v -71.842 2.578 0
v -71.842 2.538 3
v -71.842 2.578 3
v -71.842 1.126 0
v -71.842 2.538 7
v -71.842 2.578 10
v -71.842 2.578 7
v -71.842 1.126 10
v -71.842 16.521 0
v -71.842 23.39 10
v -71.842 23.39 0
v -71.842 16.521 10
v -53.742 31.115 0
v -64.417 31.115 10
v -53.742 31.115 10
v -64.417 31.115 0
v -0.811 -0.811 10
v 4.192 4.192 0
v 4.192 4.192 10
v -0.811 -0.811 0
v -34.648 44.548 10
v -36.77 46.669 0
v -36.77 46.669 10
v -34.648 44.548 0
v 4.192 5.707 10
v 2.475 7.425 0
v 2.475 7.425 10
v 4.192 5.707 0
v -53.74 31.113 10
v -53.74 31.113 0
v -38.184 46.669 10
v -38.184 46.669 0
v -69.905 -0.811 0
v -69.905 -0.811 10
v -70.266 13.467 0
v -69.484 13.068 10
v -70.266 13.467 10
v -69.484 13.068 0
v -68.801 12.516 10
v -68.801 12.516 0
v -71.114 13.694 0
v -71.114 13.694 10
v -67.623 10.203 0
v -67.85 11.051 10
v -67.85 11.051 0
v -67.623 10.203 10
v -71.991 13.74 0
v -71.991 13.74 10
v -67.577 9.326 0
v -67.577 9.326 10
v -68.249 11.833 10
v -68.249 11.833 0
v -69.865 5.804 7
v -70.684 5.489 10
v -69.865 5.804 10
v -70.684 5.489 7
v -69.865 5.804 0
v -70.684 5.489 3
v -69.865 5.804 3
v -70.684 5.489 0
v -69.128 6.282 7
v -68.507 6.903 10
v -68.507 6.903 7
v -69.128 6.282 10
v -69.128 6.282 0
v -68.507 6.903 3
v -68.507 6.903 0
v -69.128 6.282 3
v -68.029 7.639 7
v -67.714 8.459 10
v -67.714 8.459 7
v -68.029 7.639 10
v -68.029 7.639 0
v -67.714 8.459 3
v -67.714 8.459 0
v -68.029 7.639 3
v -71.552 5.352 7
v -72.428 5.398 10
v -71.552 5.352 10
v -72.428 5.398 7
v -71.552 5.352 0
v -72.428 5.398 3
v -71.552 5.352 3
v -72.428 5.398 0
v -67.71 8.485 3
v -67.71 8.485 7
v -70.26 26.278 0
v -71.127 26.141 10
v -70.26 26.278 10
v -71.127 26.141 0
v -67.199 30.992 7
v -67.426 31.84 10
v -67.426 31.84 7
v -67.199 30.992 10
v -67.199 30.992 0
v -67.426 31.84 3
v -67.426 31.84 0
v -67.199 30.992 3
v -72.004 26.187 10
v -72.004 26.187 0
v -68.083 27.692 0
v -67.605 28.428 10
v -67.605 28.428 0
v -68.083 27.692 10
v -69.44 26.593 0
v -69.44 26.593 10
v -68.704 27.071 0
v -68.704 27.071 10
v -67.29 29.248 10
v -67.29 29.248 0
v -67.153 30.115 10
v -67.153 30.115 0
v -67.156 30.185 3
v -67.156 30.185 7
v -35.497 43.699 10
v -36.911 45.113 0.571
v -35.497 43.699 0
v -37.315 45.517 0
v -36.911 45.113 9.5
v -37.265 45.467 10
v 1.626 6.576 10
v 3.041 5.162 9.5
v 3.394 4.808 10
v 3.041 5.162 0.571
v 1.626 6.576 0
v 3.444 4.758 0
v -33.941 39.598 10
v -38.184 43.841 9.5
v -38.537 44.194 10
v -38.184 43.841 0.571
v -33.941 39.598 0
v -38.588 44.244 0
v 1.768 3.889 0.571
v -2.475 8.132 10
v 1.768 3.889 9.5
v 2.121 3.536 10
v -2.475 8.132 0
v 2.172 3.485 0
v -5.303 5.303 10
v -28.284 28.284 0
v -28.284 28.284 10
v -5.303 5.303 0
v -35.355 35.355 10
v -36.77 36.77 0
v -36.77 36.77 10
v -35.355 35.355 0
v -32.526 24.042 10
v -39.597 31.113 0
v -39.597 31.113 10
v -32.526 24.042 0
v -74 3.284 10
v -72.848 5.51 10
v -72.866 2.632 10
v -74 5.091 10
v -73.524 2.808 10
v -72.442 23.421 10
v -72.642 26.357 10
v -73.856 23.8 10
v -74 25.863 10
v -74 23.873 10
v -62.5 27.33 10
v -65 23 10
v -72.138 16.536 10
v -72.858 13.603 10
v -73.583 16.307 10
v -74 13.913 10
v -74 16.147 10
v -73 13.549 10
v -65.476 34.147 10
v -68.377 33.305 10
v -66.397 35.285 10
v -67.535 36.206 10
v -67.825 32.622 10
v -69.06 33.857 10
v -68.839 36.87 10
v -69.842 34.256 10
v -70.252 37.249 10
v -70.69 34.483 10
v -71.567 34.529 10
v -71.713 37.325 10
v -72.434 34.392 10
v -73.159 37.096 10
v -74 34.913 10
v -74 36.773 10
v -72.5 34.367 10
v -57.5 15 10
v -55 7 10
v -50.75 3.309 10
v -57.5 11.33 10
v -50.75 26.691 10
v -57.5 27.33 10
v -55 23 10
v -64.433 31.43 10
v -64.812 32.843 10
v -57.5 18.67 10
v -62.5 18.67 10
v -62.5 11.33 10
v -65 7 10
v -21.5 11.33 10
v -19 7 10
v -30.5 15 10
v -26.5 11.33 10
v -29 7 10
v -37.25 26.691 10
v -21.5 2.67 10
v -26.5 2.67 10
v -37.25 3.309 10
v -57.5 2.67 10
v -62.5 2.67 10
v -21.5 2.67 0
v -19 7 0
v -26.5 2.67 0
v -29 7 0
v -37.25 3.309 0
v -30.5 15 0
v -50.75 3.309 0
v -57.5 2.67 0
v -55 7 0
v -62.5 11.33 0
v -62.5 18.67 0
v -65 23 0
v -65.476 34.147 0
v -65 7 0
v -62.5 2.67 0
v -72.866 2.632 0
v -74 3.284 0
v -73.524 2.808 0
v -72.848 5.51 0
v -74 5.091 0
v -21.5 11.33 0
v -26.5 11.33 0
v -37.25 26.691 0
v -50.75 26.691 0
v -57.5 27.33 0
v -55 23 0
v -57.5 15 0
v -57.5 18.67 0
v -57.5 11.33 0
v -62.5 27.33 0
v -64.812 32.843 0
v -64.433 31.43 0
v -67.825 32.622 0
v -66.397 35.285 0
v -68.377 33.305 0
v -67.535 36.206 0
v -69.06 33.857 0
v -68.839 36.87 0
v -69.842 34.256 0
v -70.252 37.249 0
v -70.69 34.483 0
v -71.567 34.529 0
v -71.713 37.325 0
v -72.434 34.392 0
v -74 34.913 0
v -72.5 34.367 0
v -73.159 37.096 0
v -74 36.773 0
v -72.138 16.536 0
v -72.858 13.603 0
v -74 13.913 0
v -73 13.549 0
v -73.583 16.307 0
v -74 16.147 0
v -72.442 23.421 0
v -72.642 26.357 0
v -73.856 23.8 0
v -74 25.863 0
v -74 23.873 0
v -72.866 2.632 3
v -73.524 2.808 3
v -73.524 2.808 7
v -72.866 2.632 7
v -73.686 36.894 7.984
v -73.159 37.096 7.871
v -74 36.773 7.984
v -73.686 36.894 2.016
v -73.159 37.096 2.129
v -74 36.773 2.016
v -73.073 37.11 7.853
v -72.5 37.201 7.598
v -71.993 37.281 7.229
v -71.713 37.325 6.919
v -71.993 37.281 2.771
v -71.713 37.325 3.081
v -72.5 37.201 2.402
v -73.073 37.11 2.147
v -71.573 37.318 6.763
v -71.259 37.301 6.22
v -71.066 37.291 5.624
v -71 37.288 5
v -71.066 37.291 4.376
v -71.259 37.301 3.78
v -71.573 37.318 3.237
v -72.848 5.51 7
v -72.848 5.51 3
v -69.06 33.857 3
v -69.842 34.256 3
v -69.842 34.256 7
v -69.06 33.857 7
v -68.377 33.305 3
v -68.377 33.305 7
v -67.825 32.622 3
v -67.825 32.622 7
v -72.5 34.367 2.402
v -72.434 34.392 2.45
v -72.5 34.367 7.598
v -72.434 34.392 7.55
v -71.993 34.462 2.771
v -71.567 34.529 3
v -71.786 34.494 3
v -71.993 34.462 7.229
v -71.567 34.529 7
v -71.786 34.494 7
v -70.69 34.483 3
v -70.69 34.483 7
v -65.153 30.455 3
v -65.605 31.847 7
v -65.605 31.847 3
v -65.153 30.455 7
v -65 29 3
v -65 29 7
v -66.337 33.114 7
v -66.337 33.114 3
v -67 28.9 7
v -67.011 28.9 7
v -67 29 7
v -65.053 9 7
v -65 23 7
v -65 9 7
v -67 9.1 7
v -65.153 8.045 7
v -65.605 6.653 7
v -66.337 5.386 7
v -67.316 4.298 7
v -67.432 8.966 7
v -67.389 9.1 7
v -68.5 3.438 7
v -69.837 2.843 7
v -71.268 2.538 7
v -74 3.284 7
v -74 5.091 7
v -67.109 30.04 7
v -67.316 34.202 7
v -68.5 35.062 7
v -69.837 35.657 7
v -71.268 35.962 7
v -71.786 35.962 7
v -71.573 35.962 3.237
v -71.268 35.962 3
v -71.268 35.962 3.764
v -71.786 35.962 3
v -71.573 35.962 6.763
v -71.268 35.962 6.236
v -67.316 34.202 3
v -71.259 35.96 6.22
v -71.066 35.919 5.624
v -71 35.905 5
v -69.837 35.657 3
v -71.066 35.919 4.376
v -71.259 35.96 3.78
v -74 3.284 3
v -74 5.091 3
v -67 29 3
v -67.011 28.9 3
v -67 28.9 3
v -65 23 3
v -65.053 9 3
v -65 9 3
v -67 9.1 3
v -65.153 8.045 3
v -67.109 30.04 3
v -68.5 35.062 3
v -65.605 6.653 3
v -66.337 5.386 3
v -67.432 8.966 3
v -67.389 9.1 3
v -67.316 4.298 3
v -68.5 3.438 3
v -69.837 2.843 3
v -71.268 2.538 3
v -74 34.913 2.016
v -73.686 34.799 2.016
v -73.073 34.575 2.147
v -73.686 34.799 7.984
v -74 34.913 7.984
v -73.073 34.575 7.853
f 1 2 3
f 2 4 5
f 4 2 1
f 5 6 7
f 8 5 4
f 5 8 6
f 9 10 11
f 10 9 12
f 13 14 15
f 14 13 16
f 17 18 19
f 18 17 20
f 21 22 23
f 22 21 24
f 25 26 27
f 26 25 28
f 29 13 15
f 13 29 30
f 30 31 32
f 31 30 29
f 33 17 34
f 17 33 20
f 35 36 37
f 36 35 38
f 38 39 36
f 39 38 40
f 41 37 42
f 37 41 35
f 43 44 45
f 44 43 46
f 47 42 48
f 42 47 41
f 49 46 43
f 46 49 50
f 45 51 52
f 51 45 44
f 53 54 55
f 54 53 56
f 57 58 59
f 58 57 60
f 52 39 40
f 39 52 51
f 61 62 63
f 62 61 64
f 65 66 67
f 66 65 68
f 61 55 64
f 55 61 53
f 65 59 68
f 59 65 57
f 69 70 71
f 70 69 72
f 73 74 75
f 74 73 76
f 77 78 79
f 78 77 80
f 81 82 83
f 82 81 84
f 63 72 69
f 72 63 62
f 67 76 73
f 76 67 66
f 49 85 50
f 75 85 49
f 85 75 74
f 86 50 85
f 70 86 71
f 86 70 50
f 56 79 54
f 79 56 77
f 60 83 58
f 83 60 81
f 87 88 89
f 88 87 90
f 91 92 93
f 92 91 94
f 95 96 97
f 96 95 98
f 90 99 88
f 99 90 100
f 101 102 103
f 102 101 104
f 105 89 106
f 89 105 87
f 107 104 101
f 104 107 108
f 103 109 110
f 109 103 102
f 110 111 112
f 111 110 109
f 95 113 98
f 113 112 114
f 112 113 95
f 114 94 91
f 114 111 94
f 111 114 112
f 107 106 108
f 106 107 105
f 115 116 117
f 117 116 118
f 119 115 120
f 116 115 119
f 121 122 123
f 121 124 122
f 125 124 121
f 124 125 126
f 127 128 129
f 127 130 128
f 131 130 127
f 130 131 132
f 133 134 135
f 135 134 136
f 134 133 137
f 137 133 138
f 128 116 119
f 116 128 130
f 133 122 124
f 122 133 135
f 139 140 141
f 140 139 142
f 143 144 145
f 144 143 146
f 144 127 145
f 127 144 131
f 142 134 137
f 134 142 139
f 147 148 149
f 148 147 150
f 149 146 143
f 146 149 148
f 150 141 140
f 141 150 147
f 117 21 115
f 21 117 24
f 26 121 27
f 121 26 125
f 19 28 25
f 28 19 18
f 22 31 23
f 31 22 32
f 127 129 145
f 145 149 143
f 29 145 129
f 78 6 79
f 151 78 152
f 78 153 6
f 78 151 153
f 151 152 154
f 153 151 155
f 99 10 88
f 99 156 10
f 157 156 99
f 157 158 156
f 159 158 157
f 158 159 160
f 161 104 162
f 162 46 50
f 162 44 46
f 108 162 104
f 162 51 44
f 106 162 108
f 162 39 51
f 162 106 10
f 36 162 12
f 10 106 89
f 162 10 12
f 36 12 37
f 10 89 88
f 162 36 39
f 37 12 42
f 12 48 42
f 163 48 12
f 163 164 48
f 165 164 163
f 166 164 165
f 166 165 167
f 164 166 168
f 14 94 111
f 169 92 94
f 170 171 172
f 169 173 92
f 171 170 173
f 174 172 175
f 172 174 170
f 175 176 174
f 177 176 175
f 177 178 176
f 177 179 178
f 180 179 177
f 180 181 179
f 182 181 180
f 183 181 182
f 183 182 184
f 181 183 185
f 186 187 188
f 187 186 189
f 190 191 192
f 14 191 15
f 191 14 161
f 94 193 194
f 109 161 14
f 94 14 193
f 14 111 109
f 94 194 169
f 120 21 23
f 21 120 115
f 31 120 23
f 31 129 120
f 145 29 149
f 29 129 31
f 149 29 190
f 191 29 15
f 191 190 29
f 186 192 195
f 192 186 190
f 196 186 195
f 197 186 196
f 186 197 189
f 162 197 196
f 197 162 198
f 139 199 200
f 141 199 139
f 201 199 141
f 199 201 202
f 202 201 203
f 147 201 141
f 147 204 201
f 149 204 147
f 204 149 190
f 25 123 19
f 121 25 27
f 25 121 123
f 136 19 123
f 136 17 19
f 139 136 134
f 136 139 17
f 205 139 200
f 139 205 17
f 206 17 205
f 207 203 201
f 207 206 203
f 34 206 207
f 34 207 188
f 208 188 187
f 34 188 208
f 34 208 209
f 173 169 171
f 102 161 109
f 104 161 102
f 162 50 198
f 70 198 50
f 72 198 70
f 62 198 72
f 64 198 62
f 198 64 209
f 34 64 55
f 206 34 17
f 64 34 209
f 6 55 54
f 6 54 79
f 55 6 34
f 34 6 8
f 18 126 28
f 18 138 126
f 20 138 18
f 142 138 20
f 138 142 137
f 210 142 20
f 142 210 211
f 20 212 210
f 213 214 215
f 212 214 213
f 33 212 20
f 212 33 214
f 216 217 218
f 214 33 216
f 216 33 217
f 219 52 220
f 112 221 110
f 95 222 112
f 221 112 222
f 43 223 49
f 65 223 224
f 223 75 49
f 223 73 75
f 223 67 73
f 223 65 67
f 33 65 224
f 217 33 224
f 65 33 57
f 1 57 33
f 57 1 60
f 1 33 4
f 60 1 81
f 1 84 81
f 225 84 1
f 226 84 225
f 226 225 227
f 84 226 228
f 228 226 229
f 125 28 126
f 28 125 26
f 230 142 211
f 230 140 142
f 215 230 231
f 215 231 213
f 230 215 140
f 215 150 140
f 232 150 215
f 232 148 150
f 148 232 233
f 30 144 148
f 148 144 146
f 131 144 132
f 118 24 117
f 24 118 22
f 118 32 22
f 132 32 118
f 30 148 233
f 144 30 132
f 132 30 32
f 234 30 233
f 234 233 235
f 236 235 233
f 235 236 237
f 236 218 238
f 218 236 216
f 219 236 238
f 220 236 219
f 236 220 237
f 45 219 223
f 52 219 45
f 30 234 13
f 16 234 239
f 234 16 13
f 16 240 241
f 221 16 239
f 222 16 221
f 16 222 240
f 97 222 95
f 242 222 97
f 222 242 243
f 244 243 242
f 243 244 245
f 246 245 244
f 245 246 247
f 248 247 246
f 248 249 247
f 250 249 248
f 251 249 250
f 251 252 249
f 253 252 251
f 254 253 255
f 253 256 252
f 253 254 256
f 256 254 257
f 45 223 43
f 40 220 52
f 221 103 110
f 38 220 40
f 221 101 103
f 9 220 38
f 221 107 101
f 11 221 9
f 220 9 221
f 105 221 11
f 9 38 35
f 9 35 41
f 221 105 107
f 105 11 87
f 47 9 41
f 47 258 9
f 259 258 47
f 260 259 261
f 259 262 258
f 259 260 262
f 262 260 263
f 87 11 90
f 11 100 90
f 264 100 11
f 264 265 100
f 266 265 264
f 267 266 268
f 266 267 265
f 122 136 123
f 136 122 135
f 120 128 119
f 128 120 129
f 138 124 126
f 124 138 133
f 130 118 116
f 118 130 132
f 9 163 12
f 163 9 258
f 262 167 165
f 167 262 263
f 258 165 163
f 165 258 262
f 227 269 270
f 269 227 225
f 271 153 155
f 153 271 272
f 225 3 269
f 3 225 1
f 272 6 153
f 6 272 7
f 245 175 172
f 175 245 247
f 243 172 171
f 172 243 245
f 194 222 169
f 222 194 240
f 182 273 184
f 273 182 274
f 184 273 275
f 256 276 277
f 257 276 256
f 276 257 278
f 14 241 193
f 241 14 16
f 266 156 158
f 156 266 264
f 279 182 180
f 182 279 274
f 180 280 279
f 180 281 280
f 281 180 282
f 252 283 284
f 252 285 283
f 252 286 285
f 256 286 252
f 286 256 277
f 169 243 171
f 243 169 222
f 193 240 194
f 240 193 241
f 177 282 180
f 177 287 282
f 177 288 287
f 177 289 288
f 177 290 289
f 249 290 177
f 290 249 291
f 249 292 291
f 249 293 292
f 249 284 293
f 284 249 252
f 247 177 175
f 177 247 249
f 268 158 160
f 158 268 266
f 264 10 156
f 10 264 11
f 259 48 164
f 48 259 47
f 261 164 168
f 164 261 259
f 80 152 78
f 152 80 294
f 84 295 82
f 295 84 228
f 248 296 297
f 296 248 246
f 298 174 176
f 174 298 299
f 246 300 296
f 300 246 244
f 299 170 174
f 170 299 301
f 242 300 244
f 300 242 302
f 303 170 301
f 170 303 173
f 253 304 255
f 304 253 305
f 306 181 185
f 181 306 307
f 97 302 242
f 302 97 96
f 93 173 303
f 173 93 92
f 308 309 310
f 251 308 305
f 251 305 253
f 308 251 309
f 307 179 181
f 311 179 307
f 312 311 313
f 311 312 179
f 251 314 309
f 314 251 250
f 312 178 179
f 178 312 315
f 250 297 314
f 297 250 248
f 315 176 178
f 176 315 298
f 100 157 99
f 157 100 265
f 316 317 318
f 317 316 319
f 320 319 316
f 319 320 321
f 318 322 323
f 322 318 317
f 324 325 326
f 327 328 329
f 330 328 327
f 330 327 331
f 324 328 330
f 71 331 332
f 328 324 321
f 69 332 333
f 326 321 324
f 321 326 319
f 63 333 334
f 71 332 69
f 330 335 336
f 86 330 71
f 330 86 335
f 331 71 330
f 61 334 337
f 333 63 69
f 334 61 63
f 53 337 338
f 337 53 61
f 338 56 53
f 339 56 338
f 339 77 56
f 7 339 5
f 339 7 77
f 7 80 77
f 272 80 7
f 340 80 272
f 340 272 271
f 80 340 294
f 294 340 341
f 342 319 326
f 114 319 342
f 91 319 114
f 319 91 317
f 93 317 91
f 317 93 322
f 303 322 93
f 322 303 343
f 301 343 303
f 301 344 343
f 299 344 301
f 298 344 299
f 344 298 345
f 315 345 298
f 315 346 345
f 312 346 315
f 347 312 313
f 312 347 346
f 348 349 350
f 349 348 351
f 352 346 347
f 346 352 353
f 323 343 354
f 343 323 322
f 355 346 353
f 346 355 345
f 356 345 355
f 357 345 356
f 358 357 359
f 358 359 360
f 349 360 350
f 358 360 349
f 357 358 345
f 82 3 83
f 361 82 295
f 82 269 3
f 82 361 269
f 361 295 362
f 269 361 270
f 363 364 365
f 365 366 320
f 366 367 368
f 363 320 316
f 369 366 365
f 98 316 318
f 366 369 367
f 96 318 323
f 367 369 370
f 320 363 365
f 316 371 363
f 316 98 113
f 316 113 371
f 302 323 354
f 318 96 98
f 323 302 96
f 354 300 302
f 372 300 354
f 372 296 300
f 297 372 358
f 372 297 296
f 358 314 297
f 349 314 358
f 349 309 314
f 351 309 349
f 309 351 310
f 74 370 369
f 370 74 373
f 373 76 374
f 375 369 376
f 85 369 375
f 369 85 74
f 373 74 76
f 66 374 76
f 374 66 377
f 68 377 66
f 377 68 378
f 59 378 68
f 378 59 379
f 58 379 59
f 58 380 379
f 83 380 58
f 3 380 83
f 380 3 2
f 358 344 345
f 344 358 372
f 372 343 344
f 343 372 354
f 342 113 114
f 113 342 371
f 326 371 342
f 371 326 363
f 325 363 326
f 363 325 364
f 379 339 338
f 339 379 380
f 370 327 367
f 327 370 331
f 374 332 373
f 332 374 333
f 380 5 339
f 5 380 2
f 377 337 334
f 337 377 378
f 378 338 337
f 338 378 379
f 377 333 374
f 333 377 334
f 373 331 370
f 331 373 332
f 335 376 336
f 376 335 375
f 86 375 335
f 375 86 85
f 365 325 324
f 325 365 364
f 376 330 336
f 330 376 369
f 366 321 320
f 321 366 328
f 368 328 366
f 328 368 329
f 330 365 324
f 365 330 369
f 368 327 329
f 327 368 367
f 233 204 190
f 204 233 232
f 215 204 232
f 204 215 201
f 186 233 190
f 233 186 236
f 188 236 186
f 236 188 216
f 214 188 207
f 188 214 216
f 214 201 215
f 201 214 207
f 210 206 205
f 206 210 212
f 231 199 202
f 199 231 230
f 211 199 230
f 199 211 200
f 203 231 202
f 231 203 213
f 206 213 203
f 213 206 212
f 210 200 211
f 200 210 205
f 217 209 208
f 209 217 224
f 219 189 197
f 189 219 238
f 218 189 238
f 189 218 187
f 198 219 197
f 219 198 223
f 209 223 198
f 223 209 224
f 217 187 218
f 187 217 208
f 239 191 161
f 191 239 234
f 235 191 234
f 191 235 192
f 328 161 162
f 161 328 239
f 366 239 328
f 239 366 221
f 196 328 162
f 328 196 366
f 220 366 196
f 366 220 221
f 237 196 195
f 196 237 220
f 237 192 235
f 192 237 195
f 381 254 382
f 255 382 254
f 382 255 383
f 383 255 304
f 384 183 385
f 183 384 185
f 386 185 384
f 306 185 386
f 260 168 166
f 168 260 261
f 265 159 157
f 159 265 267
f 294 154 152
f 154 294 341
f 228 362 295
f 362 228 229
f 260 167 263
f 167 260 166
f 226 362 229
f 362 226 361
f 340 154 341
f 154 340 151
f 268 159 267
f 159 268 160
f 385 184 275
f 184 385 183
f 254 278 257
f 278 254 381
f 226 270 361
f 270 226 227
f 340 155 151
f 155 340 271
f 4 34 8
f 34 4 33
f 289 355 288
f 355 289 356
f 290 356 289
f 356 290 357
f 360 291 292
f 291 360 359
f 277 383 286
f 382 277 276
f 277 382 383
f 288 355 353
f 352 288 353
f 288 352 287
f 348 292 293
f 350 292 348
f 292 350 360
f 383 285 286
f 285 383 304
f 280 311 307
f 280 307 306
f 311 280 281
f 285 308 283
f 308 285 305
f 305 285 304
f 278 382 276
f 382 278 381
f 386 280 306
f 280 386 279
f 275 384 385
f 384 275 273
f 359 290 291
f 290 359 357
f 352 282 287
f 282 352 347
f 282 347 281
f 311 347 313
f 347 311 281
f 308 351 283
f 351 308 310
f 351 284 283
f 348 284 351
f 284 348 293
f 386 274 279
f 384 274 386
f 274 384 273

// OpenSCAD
// PRUSA iteration3
// lcd-support-A
// GNU GPL v3
// Josef Průša <iam@josefprusa.cz> and contributors
// http://www.reprap.org/wiki/Prusa_Mendel
// http://prusamendel.org




module body(){

difference() {
    
    union(){
        translate( [ -55, -2 , 0 ] ) cube( [ 69 , 81 , 10 ] ); 
    }
    
    union (){

    // outer body shape
    translate( [ -69.6, 32, -1 ] ) rotate([0,0,45]) cube( [ 60 , 53 , 15 ] ); 
    translate( [ 13.7, 89.7, -1 ] ) rotate([0,0,135]) cube( [ 60 , 42 , 15 ] );
    translate( [ -19, -9, -1 ] ) cube( [ 60 , 9 , 15 ] );   
    translate( [ 7, -3, -1 ] ) cube( [ 60 , 68 , 16 ] );  
    translate( [ -16, 60, -1 ] ) cube( [ 60 , 50 , 15 ] );
    translate( [ -41, -45, -1 ] ) rotate([0,0,45]) cube( [ 60 , 80 , 13 ] );  
        
    // threaded rods opening
    translate( [ -44 , 57.5 , -1 ] ) cylinder( h = 17, r = 4.2, $fn=30);  
    translate( [ -29 , 71.9 , -1 ] ) cylinder( h = 17, r = 4.2, $fn=30);  

    // pcb cout out
    translate( [ 4 , 1.5 , -1 ] ) cube( [ 1.8 , 56.5 , 17 ] ); 
    translate( [ 0 , 7.5 , -1 ] ) cube( [ 5.8 , 44.5 , 17 ] ); 
    translate( [ -5.999, 40, -1 ] ) cube ( [ 6, 10, 17 ] );
    translate( [ 4.8 , 3.5 , -1 ] ) cube( [ 5.8 , 52.5 , 17 ] );

    translate( [ 8 , -5 , -1 ] ) rotate([0,0,45]) cube( [ 5 , 5 , 17 ] );
    translate( [ 8 , 58 , -1 ] ) rotate([0,0,45]) cube( [ 5 , 5 , 17 ] );
        
    }

    // pcb inserts
    translate( [ 4, 3 , 8 ] ) rotate([45,0,0]) cube( [ 1.8 , 5 , 5 ] ); 
    translate( [ 4, 56.5 , 8 ] ) rotate([45,0,0]) cube( [ 1.8 , 5 , 5 ] );     
    translate( [ 4, 3 , -5 ] ) rotate([45,0,0]) cube( [ 1.8 , 5 , 5 ] ); 
    translate( [ 4, 56.5 , -5 ] ) rotate([45,0,0]) cube( [ 1.8 , 5 , 5 ] );     
    
}

 
difference(){
    union(){
        translate( [ -44 , 57.5 , 0 ] ) cylinder( h = 10, r = 7, $fn=30); 
        translate( [ -29 , 71.9 , 0 ] ) cylinder( h = 10, r =7 , $fn=30); 
    }
        translate( [ -44 , 57.5 , -1 ] ) cylinder( h = 17, r = 4.2, $fn=30);
        translate( [ -29 , 71.9 , -1 ] ) cylinder( h = 17, r = 4.2, $fn=30);
}
}



module ziptie()
{
difference()
{
  union(){
    difference(){
        translate( [ -72 , 29 , 3 ] ) cylinder( h = 4, r = 7, $fn=30);
        translate( [ -72 , 29 , 3 ] ) cylinder( h = 4, r = 5, $fn=30);
    }
    difference(){
        translate( [ -72 , 9.5 , 3 ] ) cylinder( h = 4, r = 7, $fn=30);
        translate( [ -72 , 11 , 3 ] ) cylinder( h = 4, r = 5, $fn=30); 
    }
    }
    translate( [ -80 , 9.1 , 3 ] )  cube( [ 15 , 19.8 , 4 ] );  
    }
    
    translate( [ -67 , 9 , 3 ] )  cube( [ 2 , 20 , 4 ] ); 
}
    




difference() {
    
rotate([0,0,45]) body();

// lightening holes
translate( [ -44 , 15 , -1 ] ) cylinder( h = 15, r = 13.5, $fn=6);  
translate( [ -24 , 7 , -1 ] ) cylinder( h = 15, r = 5, $fn=6);  
translate( [ -60 , 7 , -1 ] ) cylinder( h = 15, r = 5, $fn=6);  
translate( [ -60 , 23 , -1 ] ) cylinder( h = 15, r = 5, $fn=6);  
    
// threaded rods corners
translate( [ -71 , 28.5 , -1 ] ) rotate([0,0,70]) cube( [ 5 , 10 , 15 ] );   
translate( [ -71 , 7.5 , -1 ] ) rotate([0,0,70]) cube( [ 5 , 10 , 15 ] );      
translate( [ -80 , 29, -1 ] ) rotate([0,0,-70]) cube( [ 5 , 10 , 15 ] );   
translate( [ -82 , 7.5 , -1 ] ) rotate([0,0,-70]) cube( [ 5 , 10 , 15 ] );      
translate( [ -86 , 0 , -1 ] ) cube( [ 12 , 50 , 15 ] );  
translate( [ -83 , -16 , -1 ] ) rotate([0,0,45]) cube( [ 20 , 20 , 15 ] );  

ziptie();
// ziptie head cutout
translate( [ -74 , 38 , 5 ] ) rotate([90,0,0]) cylinder( h = 5, r = 3, $fn=30);  
    


}
